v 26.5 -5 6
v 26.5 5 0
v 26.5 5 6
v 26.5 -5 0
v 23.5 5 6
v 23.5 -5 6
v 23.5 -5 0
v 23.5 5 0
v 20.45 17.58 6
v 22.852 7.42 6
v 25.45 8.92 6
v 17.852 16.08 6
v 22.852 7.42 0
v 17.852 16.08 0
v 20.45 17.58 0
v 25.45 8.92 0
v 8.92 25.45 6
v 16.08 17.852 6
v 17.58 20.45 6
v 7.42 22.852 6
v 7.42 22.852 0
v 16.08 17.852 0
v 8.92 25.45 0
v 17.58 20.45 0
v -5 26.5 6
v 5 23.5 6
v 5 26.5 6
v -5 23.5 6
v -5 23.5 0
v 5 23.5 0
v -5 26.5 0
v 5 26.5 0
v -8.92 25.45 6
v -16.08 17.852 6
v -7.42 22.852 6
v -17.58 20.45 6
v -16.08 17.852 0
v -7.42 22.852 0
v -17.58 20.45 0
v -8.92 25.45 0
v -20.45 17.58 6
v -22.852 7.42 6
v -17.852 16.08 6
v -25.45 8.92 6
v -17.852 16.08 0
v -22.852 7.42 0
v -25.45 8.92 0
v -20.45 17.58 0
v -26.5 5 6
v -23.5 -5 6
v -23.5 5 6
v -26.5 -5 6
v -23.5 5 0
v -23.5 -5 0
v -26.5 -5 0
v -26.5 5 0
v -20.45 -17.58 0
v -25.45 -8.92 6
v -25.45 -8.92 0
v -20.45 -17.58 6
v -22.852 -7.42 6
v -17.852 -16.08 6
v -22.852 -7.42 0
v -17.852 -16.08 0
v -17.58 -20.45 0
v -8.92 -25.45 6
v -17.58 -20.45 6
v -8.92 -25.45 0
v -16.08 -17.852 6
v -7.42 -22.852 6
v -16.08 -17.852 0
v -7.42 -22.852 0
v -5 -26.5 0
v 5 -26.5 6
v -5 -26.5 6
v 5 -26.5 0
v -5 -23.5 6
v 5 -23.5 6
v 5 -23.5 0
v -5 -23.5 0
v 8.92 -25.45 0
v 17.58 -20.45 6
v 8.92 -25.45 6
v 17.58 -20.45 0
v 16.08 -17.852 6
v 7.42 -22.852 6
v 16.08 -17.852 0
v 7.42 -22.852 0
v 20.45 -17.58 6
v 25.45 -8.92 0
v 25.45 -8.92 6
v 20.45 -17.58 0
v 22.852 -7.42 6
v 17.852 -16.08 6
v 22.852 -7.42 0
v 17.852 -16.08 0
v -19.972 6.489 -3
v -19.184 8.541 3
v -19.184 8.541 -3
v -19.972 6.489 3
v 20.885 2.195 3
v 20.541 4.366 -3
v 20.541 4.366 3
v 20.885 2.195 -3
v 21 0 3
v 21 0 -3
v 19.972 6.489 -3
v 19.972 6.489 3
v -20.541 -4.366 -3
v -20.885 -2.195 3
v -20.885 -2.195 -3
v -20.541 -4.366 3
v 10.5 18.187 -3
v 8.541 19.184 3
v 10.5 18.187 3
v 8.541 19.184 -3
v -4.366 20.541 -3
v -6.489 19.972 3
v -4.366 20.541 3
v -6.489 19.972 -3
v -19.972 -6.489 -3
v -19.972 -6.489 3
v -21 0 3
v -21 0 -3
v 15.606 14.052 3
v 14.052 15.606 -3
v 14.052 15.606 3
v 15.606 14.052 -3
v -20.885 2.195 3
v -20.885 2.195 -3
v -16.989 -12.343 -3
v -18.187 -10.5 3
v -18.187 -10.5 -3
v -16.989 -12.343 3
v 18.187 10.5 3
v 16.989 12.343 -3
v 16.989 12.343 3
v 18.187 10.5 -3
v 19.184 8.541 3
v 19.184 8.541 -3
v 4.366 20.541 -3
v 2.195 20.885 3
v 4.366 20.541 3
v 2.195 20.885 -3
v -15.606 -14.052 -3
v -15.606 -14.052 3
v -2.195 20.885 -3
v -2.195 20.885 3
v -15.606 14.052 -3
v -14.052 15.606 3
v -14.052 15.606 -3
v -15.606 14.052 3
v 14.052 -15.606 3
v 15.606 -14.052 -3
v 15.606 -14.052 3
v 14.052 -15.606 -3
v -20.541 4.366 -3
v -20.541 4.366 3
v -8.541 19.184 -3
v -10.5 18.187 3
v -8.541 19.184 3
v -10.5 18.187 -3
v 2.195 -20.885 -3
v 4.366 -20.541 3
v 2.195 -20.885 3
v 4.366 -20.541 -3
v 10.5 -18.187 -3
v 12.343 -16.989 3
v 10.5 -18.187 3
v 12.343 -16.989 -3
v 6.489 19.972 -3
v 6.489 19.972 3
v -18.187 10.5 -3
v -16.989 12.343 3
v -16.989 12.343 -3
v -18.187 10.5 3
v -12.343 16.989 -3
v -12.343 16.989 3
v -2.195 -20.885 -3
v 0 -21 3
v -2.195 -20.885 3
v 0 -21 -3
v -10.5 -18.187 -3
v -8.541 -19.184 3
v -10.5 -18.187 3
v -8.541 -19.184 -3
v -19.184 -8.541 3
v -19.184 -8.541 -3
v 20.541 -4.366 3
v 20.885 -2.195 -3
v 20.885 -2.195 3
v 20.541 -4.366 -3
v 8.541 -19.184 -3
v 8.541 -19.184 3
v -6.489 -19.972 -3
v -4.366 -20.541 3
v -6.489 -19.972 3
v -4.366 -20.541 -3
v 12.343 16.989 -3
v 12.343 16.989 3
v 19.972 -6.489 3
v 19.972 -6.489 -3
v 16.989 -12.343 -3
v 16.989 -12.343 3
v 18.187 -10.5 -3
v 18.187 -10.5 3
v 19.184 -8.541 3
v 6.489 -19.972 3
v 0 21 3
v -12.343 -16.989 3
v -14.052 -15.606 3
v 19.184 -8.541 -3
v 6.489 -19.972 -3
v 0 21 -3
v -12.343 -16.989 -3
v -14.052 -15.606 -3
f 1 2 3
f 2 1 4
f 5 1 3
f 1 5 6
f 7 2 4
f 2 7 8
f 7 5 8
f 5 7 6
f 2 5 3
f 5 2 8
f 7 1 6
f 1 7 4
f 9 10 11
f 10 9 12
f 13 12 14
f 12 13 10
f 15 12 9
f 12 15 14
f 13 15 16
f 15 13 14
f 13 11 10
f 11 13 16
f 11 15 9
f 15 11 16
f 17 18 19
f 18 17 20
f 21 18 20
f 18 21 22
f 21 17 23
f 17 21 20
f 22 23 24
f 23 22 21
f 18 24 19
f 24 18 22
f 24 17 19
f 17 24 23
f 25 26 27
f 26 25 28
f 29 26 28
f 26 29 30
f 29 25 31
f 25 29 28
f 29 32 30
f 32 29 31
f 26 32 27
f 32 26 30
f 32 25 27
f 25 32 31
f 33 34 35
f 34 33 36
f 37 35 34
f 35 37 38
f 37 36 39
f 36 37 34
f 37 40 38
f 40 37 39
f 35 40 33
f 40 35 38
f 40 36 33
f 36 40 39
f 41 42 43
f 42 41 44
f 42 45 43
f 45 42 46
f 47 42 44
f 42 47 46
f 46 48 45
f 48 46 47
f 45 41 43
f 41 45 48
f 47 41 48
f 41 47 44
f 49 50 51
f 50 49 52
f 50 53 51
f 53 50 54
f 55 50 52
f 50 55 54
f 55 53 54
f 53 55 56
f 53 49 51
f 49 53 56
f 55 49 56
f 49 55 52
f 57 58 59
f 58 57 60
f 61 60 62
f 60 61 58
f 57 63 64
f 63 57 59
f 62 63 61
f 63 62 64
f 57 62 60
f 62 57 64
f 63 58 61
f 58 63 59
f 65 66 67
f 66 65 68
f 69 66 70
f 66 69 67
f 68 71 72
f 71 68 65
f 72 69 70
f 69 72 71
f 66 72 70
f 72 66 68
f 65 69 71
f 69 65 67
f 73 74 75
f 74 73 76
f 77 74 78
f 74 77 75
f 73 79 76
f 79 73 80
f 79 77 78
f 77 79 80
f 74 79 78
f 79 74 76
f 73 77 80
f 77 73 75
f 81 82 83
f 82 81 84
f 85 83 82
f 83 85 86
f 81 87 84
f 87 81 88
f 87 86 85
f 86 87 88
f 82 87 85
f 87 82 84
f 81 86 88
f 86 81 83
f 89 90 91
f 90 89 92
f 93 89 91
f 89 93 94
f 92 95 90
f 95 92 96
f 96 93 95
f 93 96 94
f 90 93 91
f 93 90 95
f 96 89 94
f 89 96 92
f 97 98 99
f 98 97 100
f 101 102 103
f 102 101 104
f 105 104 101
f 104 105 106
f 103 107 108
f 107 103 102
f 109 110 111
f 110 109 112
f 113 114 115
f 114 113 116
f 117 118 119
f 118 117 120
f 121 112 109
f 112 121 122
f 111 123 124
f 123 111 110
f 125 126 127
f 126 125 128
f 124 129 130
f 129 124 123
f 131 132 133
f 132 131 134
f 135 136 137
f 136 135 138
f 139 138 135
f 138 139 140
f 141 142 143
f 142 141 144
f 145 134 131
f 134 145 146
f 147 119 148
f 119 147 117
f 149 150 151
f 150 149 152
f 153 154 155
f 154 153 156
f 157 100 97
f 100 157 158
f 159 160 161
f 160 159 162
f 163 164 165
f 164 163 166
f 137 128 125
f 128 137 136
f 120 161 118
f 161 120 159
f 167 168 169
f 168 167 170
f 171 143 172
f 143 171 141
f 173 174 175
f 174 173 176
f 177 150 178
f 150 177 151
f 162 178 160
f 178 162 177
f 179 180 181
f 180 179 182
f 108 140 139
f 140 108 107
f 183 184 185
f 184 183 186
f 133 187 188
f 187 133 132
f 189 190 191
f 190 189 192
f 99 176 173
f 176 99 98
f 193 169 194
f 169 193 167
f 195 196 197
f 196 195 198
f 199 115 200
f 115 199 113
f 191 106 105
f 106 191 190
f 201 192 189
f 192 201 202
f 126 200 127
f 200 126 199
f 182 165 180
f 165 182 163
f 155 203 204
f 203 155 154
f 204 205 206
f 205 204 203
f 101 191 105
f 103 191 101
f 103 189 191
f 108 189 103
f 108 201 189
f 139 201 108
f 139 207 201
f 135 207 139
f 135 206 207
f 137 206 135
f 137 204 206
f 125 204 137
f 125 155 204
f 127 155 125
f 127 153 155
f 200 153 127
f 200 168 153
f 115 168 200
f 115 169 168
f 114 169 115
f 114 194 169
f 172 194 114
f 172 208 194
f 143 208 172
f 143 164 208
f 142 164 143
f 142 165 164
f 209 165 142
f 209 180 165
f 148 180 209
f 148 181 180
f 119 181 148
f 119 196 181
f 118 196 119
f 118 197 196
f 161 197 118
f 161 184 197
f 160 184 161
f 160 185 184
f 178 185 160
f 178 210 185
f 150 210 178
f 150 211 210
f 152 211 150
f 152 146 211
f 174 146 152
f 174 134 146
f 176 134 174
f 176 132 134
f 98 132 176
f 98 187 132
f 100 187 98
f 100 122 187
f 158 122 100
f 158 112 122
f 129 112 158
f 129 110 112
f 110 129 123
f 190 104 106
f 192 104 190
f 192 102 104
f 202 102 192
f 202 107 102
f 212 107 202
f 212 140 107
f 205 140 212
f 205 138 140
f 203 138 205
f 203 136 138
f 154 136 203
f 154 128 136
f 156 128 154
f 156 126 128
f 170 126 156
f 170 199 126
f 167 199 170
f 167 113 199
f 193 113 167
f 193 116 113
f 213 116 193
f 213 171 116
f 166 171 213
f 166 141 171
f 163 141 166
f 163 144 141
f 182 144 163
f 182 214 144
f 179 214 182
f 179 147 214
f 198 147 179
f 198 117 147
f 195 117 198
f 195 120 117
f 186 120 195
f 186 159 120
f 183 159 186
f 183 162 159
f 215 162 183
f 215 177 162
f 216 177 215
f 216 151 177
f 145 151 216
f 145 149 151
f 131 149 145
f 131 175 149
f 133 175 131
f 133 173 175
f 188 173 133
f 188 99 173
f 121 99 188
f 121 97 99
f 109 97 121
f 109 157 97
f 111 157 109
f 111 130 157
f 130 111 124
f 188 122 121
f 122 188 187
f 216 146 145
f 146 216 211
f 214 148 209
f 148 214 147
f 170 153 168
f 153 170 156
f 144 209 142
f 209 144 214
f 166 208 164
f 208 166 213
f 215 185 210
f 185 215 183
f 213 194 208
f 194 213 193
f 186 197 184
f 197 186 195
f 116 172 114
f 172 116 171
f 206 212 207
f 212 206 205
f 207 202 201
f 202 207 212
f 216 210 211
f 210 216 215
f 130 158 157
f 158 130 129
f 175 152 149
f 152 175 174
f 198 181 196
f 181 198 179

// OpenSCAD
// User-defined modules, for-loops, and variables.

module gear_tooth_block(w = 3, h = 10, d = 6) {
    translate([0, 0, d / 2]) cube([w, h, d], center = true);
}

n = 12;
radius = 25;

for (i = [0 : n - 1]) {
    a = i * 360 / n;
    rotate([0, 0, a])
        translate([radius, 0, 0])
        gear_tooth_block();
}

cylinder(r = radius - 4, h = 6, center = true, $fn = 60);
